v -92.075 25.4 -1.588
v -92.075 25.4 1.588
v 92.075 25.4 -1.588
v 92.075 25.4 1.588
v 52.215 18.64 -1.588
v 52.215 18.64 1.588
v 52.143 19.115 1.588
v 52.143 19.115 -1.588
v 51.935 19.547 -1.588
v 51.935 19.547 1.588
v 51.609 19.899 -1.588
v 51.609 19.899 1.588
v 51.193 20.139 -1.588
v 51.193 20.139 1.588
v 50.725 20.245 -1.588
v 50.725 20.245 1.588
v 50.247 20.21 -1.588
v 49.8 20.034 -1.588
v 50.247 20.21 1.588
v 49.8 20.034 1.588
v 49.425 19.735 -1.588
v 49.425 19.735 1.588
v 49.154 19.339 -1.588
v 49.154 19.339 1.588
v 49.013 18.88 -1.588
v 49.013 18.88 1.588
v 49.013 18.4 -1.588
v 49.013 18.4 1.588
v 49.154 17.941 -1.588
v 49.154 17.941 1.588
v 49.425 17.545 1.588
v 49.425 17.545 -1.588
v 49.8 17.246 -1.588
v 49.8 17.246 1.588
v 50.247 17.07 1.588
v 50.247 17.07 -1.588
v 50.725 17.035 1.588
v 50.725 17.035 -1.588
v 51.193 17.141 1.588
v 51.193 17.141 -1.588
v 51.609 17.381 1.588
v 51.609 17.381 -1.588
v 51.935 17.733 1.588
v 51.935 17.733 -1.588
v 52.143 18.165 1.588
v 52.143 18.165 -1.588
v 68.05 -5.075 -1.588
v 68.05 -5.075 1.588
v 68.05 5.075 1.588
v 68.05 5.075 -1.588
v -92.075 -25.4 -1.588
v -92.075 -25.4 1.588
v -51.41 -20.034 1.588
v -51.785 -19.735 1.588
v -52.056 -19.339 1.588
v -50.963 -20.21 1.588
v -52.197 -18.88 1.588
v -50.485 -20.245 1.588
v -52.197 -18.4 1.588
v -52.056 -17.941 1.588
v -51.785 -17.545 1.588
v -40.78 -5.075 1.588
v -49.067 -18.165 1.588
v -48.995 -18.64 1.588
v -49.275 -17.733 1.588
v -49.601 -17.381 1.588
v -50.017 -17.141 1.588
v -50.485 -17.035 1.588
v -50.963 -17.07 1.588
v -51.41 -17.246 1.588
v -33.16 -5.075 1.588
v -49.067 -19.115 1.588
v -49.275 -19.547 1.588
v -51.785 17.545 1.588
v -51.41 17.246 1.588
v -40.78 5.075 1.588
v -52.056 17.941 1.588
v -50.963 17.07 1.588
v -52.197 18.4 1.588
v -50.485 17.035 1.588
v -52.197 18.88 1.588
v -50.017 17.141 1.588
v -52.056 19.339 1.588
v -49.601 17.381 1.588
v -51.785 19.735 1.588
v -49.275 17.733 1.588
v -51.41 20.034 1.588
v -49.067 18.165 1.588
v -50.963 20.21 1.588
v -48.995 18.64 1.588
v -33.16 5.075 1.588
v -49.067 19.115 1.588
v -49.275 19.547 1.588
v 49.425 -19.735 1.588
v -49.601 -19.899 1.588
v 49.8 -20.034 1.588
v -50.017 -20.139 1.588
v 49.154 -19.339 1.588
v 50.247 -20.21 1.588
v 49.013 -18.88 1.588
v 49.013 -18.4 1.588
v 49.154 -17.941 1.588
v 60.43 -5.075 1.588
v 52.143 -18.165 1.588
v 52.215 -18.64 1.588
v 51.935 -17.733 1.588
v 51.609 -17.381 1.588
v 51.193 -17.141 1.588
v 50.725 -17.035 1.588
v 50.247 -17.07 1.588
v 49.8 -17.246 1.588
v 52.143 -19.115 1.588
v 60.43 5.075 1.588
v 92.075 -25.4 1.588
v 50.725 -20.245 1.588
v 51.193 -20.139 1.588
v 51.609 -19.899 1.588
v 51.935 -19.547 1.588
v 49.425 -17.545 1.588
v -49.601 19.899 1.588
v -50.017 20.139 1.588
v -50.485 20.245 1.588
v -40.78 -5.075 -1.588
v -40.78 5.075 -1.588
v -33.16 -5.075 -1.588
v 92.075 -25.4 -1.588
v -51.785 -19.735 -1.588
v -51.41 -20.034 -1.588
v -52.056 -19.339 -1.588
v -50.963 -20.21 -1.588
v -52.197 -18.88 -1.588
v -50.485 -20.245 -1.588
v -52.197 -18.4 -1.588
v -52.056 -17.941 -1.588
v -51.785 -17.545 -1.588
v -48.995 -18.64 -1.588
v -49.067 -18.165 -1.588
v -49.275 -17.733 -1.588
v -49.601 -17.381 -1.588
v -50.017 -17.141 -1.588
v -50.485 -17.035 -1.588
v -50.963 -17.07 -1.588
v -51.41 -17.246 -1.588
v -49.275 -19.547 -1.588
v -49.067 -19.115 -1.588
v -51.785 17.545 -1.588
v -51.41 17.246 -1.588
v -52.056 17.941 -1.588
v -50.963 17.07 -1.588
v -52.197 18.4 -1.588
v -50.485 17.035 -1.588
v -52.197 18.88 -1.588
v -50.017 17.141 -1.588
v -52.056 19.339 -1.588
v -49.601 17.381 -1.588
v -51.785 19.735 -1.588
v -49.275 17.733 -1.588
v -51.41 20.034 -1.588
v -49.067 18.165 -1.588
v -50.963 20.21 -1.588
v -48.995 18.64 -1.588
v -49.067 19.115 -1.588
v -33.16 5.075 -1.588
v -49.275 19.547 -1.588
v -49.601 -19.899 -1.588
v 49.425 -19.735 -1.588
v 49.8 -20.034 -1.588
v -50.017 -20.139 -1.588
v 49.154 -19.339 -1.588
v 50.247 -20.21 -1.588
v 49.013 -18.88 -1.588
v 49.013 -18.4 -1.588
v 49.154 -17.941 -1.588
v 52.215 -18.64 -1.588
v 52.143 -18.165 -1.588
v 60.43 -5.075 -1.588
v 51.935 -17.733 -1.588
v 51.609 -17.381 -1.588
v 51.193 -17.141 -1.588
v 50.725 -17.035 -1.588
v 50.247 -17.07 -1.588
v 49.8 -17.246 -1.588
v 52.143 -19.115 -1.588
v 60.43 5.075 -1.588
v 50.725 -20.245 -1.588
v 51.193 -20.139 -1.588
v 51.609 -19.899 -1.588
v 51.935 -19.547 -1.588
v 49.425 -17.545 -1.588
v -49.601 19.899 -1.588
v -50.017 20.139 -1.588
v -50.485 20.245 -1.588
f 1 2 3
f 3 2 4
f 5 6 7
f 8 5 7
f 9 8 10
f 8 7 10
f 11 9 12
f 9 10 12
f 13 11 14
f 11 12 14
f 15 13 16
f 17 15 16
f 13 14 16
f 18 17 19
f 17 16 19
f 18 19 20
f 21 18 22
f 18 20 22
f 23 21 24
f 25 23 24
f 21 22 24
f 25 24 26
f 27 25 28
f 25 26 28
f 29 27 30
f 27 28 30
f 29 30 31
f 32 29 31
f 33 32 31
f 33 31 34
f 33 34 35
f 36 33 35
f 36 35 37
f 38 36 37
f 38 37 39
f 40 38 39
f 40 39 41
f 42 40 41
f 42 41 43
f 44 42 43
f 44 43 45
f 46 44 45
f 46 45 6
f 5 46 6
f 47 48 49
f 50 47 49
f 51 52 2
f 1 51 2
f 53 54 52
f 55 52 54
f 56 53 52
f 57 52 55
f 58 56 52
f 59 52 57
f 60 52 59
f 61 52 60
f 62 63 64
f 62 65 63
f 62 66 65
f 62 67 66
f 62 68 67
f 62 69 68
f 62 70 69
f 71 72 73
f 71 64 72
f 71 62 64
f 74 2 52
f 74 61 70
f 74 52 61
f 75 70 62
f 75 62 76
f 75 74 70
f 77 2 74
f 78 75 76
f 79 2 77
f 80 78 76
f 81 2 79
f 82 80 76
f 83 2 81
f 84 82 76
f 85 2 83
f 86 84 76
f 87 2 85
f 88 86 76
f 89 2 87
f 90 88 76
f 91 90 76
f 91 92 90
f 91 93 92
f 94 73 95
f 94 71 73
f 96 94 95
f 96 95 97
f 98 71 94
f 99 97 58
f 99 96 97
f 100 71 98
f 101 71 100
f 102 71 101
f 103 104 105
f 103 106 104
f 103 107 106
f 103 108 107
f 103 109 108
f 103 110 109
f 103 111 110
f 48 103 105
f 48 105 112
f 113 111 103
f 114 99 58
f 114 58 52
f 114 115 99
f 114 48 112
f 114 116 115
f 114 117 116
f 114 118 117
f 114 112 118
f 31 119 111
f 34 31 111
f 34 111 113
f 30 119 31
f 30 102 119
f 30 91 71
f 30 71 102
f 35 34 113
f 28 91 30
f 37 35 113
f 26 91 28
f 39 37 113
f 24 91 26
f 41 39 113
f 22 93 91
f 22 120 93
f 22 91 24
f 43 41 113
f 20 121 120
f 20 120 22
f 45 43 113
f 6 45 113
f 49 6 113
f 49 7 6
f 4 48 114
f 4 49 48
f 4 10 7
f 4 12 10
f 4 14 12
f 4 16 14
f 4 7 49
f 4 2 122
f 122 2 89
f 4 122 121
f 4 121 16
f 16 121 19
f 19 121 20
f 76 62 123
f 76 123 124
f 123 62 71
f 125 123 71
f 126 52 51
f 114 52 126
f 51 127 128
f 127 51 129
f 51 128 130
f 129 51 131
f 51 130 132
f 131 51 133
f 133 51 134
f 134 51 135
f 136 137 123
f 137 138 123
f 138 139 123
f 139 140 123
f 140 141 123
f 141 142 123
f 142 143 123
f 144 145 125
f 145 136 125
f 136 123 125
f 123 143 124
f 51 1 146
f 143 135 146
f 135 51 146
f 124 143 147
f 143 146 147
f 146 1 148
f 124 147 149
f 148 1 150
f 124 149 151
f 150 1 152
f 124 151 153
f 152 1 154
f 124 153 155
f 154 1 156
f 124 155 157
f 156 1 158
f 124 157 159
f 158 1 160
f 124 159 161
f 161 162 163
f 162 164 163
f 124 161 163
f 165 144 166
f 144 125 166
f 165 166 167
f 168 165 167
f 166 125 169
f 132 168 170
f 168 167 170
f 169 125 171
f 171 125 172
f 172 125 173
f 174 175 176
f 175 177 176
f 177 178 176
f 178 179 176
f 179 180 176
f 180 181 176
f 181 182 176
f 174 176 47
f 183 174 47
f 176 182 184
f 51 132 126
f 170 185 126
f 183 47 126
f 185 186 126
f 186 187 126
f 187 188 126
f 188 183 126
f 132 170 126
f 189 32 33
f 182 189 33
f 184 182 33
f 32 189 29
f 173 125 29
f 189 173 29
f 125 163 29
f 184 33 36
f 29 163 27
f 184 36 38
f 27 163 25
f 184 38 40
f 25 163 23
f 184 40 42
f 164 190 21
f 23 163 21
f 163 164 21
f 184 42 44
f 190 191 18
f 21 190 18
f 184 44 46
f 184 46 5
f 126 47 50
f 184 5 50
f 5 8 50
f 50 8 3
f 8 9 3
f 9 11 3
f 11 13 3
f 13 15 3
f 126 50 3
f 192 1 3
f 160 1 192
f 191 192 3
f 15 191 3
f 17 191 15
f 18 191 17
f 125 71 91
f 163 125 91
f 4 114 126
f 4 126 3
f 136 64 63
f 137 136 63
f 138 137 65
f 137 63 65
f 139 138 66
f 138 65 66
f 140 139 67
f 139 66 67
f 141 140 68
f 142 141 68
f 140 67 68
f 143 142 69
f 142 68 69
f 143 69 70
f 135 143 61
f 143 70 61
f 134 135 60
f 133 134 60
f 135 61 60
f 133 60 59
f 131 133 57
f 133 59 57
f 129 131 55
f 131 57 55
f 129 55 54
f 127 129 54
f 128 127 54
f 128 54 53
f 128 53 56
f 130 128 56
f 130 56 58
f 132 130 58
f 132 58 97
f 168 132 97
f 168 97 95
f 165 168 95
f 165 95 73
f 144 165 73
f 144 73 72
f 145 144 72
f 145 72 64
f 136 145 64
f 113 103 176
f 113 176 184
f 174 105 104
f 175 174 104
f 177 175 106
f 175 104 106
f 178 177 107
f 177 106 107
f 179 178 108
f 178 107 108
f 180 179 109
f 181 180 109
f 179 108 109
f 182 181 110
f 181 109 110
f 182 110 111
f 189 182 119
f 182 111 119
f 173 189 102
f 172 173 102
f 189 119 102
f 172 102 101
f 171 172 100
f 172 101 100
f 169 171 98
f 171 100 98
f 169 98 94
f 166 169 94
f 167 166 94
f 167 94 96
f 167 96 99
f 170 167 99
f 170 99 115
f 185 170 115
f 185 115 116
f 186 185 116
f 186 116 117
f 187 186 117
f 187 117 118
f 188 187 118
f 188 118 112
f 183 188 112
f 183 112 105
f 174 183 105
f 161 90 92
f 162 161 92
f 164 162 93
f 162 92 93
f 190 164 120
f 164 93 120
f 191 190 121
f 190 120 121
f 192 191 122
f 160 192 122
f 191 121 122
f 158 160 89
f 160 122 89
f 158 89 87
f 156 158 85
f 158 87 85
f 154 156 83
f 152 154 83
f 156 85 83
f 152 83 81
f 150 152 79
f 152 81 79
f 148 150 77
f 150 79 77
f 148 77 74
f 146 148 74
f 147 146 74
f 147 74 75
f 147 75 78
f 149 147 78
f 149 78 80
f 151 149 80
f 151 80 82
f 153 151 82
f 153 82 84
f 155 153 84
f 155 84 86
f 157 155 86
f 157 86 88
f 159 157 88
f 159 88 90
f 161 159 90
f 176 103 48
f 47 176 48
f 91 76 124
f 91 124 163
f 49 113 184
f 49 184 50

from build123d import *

# Parameters (mm, degrees)
SKETCH2_W           = 184.15
SKETCH2_H           = 50.8
BOSS_EXTRUDE1_DEPTH = 1.5875
SKETCH3_R           = 1.61
SKETCH3_W           = 7.62
SKETCH3_H           = 10.15
CUT_EXTRUDE1_DEPTH  = 5.08


with BuildPart() as part:
    # Sketch2 → Boss-Extrude1 (new body, symmetric)
    with BuildSketch(Plane.XY):
        Rectangle(SKETCH2_W, SKETCH2_H)
    extrude(amount=BOSS_EXTRUDE1_DEPTH, both=True)

    # Sketch3 → Cut-Extrude1 (cut)
    with BuildSketch(Plane.XY.offset(1.5875)):
        with Locations((-50.605000009, 18.64)):
            Circle(SKETCH3_R)
        with Locations((-50.605000009, -18.64)):
            Circle(SKETCH3_R)
        with Locations((50.605000009, 18.64)):
            Circle(SKETCH3_R)
        with Locations((50.605000009, -18.64)):
            Circle(SKETCH3_R)
        with Locations((-36.970000018, 0)):
            Rectangle(SKETCH3_W, SKETCH3_H)
        with Locations((64.24, 0)):
            Rectangle(SKETCH3_W, SKETCH3_H)
    extrude(amount=-CUT_EXTRUDE1_DEPTH, mode=Mode.SUBTRACT)


solid = part.part
